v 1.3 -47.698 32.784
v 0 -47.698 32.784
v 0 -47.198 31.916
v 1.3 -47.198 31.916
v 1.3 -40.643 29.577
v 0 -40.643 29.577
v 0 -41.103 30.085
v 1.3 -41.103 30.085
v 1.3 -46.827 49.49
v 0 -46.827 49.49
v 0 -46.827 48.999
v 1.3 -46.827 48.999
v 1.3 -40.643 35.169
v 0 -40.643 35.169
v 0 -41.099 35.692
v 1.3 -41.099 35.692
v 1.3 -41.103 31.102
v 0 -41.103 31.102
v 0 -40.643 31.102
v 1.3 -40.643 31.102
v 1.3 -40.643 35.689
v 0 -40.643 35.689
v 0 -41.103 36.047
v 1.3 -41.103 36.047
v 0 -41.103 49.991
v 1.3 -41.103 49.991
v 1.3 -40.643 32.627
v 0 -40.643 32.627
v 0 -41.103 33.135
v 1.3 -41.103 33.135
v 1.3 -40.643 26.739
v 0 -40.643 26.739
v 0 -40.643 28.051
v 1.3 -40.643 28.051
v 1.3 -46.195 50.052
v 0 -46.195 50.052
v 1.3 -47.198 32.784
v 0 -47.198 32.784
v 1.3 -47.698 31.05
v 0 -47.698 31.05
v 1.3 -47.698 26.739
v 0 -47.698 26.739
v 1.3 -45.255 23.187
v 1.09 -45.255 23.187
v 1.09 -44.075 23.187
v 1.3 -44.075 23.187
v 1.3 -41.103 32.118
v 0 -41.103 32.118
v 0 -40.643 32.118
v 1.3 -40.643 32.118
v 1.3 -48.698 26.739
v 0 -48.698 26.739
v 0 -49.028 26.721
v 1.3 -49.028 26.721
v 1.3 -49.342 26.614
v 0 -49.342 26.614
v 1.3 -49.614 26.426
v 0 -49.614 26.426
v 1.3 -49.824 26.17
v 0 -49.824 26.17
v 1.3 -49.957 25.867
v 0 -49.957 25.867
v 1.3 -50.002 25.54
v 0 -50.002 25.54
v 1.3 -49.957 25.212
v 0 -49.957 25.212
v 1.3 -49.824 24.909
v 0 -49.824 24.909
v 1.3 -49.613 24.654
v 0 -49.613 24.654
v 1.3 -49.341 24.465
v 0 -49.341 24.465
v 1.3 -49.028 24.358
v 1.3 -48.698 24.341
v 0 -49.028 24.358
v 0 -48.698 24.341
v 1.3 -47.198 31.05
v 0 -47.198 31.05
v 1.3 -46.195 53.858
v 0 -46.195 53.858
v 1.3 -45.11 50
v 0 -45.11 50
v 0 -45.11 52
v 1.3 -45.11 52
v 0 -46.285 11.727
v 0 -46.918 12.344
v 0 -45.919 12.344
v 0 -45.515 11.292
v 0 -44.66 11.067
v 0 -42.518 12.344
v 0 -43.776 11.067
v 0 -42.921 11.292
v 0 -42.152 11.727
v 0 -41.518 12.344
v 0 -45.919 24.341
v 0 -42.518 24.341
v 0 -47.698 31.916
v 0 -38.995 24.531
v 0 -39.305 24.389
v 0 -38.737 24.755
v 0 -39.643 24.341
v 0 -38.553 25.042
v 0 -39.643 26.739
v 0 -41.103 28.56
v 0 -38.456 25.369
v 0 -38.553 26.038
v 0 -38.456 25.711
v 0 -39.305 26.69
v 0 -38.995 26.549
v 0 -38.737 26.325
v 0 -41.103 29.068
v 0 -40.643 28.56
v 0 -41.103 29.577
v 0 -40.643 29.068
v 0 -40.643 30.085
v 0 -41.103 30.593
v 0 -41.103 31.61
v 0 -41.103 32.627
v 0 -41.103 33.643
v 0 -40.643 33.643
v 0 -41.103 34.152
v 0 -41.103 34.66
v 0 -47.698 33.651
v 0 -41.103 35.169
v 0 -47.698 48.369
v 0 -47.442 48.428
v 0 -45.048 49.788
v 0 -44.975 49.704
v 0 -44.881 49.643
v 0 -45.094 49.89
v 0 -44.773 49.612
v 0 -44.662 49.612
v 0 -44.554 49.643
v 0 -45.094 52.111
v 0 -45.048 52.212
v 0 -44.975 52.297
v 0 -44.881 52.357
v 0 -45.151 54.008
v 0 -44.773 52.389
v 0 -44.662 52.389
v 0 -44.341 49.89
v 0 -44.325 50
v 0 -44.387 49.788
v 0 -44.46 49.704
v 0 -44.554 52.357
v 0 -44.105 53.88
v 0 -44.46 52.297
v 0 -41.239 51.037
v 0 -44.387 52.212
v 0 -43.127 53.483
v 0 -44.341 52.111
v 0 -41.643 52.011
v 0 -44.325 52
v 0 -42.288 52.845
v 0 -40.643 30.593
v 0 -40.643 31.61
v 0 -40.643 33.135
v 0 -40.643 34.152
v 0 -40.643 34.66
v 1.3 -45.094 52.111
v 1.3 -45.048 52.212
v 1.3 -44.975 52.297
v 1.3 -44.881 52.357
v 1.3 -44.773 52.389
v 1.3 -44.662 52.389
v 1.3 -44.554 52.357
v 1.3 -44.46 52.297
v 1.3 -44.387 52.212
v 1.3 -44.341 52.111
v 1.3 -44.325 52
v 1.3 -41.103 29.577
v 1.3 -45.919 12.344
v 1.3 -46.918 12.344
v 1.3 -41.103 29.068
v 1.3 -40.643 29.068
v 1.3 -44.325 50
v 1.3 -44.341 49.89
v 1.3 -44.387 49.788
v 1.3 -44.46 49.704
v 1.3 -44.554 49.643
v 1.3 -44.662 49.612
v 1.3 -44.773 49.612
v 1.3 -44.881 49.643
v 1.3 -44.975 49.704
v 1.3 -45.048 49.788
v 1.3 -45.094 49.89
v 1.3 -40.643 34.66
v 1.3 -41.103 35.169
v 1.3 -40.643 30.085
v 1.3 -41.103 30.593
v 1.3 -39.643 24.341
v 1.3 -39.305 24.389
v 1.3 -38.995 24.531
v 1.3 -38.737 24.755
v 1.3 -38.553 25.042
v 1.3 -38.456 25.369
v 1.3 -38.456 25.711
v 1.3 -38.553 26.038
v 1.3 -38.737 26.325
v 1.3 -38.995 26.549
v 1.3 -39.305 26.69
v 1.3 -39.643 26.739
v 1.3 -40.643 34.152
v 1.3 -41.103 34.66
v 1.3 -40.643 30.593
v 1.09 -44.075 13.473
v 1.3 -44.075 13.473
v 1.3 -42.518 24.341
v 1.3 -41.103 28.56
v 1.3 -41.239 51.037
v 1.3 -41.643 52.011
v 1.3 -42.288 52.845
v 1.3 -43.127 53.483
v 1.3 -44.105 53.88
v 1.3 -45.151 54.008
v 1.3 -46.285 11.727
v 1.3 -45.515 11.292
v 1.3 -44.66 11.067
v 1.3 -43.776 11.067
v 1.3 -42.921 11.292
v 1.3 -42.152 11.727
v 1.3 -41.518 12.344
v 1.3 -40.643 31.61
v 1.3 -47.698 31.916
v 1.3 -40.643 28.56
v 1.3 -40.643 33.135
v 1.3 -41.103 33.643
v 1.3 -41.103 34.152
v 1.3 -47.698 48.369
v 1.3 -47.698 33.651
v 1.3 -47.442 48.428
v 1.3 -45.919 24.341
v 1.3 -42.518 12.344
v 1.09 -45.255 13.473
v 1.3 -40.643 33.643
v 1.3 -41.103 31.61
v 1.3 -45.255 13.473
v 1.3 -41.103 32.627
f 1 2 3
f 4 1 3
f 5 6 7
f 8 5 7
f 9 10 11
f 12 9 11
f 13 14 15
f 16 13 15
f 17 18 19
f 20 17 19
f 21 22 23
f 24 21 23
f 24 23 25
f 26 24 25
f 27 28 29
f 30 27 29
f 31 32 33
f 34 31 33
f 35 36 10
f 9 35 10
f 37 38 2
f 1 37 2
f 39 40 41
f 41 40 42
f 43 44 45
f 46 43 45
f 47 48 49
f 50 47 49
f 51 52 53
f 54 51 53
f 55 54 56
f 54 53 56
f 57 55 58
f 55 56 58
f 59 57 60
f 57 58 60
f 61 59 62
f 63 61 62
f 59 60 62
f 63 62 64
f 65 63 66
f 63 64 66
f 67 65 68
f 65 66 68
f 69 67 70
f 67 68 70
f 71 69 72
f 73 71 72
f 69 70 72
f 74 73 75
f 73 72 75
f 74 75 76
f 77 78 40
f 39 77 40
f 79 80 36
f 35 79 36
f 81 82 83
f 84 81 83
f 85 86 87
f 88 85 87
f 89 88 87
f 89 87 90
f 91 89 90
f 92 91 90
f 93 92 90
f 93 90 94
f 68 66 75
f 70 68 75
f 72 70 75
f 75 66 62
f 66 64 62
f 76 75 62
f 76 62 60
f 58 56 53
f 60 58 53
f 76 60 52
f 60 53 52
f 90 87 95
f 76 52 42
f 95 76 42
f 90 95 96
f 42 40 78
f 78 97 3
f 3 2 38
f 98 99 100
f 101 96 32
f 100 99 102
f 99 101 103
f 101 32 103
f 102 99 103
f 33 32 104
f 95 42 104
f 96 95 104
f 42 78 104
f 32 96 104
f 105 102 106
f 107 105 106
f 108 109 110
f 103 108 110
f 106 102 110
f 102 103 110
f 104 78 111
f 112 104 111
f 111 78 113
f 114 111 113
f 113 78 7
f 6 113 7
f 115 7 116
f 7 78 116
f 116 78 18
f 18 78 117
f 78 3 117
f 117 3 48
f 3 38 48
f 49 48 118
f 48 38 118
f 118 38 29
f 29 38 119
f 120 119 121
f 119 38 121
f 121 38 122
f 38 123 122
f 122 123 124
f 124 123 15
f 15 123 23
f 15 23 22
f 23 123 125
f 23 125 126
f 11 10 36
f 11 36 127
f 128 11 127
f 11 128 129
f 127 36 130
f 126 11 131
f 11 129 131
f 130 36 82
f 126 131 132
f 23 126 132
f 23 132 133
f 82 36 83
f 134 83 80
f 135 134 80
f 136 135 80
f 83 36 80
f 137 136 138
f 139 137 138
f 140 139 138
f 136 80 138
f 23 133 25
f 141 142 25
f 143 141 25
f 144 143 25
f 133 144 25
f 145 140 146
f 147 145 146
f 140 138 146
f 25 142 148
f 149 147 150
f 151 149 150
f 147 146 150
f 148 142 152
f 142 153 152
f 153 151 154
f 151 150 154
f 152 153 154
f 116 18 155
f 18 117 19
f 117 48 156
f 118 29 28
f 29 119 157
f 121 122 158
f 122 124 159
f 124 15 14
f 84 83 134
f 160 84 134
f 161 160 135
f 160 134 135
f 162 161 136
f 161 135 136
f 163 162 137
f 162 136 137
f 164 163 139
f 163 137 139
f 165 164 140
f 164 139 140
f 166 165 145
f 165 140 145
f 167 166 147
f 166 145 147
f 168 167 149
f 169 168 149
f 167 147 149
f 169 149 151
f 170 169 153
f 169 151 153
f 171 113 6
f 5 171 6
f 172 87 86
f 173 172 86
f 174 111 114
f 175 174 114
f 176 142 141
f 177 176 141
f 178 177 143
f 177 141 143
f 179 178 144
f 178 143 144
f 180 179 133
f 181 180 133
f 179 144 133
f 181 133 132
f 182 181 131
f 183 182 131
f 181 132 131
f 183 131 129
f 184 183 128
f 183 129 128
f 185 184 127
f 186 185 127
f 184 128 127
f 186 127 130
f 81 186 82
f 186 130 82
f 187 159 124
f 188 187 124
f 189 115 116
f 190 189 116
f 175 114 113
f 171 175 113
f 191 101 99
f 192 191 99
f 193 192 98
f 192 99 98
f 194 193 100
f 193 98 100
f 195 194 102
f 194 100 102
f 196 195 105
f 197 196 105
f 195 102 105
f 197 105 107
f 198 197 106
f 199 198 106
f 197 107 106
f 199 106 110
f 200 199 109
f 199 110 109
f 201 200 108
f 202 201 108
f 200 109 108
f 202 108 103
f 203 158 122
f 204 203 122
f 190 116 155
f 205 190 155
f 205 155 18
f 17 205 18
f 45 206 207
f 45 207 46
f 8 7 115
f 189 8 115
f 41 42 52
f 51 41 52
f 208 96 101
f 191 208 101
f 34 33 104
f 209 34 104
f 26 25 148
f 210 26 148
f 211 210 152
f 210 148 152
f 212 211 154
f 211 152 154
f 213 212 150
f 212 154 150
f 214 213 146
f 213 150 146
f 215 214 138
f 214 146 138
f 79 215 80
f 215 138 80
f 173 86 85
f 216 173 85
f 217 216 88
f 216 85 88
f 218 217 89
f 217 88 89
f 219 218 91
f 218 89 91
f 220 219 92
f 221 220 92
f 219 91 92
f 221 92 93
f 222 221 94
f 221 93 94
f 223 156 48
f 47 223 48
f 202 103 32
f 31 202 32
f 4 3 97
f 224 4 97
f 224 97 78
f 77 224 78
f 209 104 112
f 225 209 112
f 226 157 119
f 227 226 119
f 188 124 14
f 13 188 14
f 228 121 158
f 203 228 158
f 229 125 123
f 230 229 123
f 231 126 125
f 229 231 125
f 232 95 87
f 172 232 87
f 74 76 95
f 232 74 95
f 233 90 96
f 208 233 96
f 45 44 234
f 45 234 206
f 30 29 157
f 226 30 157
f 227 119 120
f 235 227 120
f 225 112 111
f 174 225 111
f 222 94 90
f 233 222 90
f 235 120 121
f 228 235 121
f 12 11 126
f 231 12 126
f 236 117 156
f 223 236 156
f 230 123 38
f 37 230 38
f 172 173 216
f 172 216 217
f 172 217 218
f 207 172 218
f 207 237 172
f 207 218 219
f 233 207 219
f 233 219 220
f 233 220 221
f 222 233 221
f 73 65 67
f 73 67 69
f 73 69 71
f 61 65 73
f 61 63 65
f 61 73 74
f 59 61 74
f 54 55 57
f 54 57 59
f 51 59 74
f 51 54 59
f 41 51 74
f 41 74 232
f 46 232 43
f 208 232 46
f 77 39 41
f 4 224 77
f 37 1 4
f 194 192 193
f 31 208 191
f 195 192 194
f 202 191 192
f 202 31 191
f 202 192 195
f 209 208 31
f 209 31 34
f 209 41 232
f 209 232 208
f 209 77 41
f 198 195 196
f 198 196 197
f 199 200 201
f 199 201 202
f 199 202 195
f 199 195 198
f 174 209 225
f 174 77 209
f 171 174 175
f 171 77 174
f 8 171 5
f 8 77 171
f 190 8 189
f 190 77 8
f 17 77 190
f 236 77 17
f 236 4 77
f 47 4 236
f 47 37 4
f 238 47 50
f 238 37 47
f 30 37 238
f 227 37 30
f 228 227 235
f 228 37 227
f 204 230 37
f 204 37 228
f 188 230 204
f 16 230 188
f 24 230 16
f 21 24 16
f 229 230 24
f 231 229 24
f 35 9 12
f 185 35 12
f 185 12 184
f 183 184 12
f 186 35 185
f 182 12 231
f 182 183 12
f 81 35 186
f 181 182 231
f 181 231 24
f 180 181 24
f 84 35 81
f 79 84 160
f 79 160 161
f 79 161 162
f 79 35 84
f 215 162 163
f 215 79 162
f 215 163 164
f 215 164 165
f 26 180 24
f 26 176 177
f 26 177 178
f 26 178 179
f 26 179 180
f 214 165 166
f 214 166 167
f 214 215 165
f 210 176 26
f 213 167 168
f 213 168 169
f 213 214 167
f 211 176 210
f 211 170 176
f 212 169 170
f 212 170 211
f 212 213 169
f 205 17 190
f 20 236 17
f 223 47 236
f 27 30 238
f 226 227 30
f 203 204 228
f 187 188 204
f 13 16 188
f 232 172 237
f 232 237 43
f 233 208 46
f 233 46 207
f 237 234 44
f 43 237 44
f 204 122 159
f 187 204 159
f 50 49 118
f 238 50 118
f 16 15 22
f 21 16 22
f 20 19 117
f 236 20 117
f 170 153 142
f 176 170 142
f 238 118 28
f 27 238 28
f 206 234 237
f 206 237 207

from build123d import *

# Parameters (mm, degrees)
F0_W     = 1.180834
F0_H     = 9.713203
F1_DEPTH = 1.3
F2_W     = 1.340505
F2_H     = 10.058258
F3_DEPTH = 1.09


with BuildPart() as f1:
    # F0 (on Right) → F1 (new body)
    with BuildSketch(Plane.YZ):
        with BuildLine():
            Line((-42.517653, 24.340816), (-45.919107, 24.340582))
            Line((-45.919107, 24.340582), (-45.919107, 12.343948))
            Line((-45.919107, 12.343948), (-42.517653, 12.343948))
            Line((-42.517653, 12.343948), (-42.517653, 14.488947))
            Line((-42.517653, 14.488947), (-42.917089, 14.488947))
            ThreePointArc((-42.917089, 14.488947), (-43.065188, 14.637046), (-42.917089, 14.785144))
            ThreePointArc((-42.917089, 14.785144), (-43.067147, 14.935202), (-42.917089, 15.08526))
            ThreePointArc((-42.917089, 15.08526), (-43.067148, 15.235318), (-42.917089, 15.385376))
            ThreePointArc((-42.917089, 15.385376), (-43.067147, 15.535434), (-42.917089, 15.685491))
            Line((-42.917089, 15.685491), (-42.517653, 15.685491))
            Line((-42.517653, 15.685491), (-42.517653, 15.985669))
            Line((-42.517653, 15.985669), (-42.917089, 15.985669))
            ThreePointArc((-42.917089, 15.985669), (-43.066833, 16.135412), (-42.917089, 16.285156))
            ThreePointArc((-42.917089, 16.285156), (-43.06723, 16.435296), (-42.917089, 16.585436))
            ThreePointArc((-42.917089, 16.585436), (-43.066944, 16.735291), (-42.917089, 16.885145))
            ThreePointArc((-42.917089, 16.885145), (-43.066944, 17.034999), (-42.917089, 17.184854))
            ThreePointArc((-42.917089, 17.184854), (-43.066939, 17.334703), (-42.917089, 17.484553))
            ThreePointArc((-42.917089, 17.484553), (-43.066944, 17.634407), (-42.917089, 17.784262))
            ThreePointArc((-42.917089, 17.784262), (-43.06694, 17.934112), (-42.917089, 18.083963))
            ThreePointArc((-42.917089, 18.083963), (-43.067242, 18.234115), (-42.917089, 18.384267))
            ThreePointArc((-42.917089, 18.384267), (-43.067037, 18.534215), (-42.917089, 18.684162))
            ThreePointArc((-42.917089, 18.684162), (-43.067005, 18.834078), (-42.917089, 18.983994))
            ThreePointArc((-42.917089, 18.983994), (-43.067149, 19.134053), (-42.917089, 19.284112))
            ThreePointArc((-42.917089, 19.284112), (-43.067628, 19.434651), (-42.917089, 19.58519))
            ThreePointArc((-42.917089, 19.58519), (-43.067149, 19.735249), (-42.917089, 19.885308))
            ThreePointArc((-42.917089, 19.885308), (-43.067196, 20.035415), (-42.917089, 20.185521))
            ThreePointArc((-42.917089, 20.185521), (-43.067148, 20.335579), (-42.917089, 20.485638))
            ThreePointArc((-42.917089, 20.485638), (-43.067148, 20.635696), (-42.917089, 20.785754))
            ThreePointArc((-42.917089, 20.785754), (-43.067148, 20.935812), (-42.917089, 21.085871))
            ThreePointArc((-42.917089, 21.085871), (-43.067302, 21.236084), (-42.917089, 21.386296))
            ThreePointArc((-42.917089, 21.386296), (-43.067148, 21.536355), (-42.917089, 21.686413))
            ThreePointArc((-42.917089, 21.686413), (-43.067147, 21.83647), (-42.917089, 21.986527))
            ThreePointArc((-42.917089, 21.986527), (-43.067058, 22.136496), (-42.917089, 22.286465))
            ThreePointArc((-42.917089, 22.286465), (-43.067286, 22.436662), (-42.917089, 22.586859))
            ThreePointArc((-42.917089, 22.586859), (-43.066941, 22.736711), (-42.917089, 22.886562))
            ThreePointArc((-42.917089, 22.886562), (-43.067068, 23.03654), (-42.917089, 23.186519))
            Line((-42.917089, 23.186519), (-42.517653, 23.186519))
            Line((-42.517653, 23.186519), (-42.517653, 24.340816))
        make_face()
        with Locations((-44.665031, 18.329918)):
            Rectangle(F0_W, F0_H, mode=Mode.SUBTRACT)
        Polygon((-48.698063, 24.340582), (-45.919107, 24.340582), (-42.517653, 24.340816), (-39.643239, 24.340816), (-39.643239, 26.738991), (-40.643002, 26.738991), (-47.697753, 26.738757), (-48.698142, 26.738757), align=None)
        with BuildLine():
            Line((-42.517653, 12.343948), (-45.919107, 12.343948))
            Line((-45.919107, 12.343948), (-46.918346, 12.343948))
            ThreePointArc((-46.918346, 12.343948), (-44.21838, 11.039016), (-41.518413, 12.343948))
            Line((-41.518413, 12.343948), (-42.517653, 12.343948))
        make_face()
        with BuildLine():
            ThreePointArc((-48.698142, 26.738757), (-50.002455, 25.539626), (-48.698063, 24.340582))
            Line((-48.698063, 24.340582), (-48.698142, 26.738757))
        make_face()
        with BuildLine():
            Line((-42.517653, 22.886562), (-42.517653, 23.186519))
            Line((-42.517653, 23.186519), (-42.917089, 23.186519))
            ThreePointArc((-42.917089, 23.186519), (-43.067068, 23.03654), (-42.917089, 22.886562))
            Line((-42.917089, 22.886562), (-42.517653, 22.886562))
        make_face()
        with BuildLine():
            Line((-39.643239, 26.738991), (-39.643239, 24.340816))
            ThreePointArc((-39.643239, 24.340816), (-38.444152, 25.539904), (-39.643239, 26.738991))
        make_face()
        with BuildLine():
            Line((-42.917089, 14.488947), (-42.517653, 14.488947))
            Line((-42.517653, 14.488947), (-42.517653, 14.785144))
            Line((-42.517653, 14.785144), (-42.917089, 14.785144))
            ThreePointArc((-42.917089, 14.785144), (-43.065188, 14.637046), (-42.917089, 14.488947))
        make_face()
        with BuildLine():
            Line((-42.517653, 22.586859), (-42.517653, 22.886562))
            Line((-42.517653, 22.886562), (-42.917089, 22.886562))
            ThreePointArc((-42.917089, 22.886562), (-43.066941, 22.736711), (-42.917089, 22.586859))
            Line((-42.917089, 22.586859), (-42.517653, 22.586859))
        make_face()
        Polygon((-47.697753, 31.049623), (-47.697753, 26.738757), (-40.643002, 26.738991), (-40.643002, 28.051442), (-41.102504, 28.559806), (-40.643002, 28.559806), (-41.102504, 29.068169), (-40.643002, 29.068169), (-41.102504, 29.576532), (-40.643002, 29.576532), (-41.102504, 30.084895), (-40.643002, 30.084895), (-41.102504, 30.593258), (-40.643002, 30.593258), (-41.102504, 31.101622), (-40.643002, 31.101622), (-41.102504, 31.609985), (-40.643002, 31.609985), (-41.102504, 32.118348), (-40.643002, 32.118348), (-41.102504, 32.626711), (-40.643002, 32.626711), (-41.102504, 33.135074), (-40.643002, 33.135074), (-41.102504, 33.643438), (-40.643002, 33.643438), (-41.102504, 34.151801), (-40.643002, 34.151801), (-41.102504, 34.660164), (-40.643002, 34.660164), (-41.102506, 35.168528), (-40.643002, 35.168528), (-41.09862, 35.692447), (-40.643002, 35.68899), (-41.102506, 36.046506), (-42.228938, 36.922926), (-42.228938, 47.611012), (-42.228938, 48.368792), (-42.228938, 49.656781), (-42.228938, 50.742287), (-42.82525, 51.877759), (-43.982454, 52.871555), (-44.859211, 53.49781), (-45.443715, 53.858385), (-46.195191, 53.858385), (-46.195191, 50.859235), (-46.195191, 50.051756), (-46.82713, 49.490034), (-46.82713, 48.998524), (-47.441577, 48.428061), (-47.697753, 48.368792), (-47.697753, 33.65064), (-47.198169, 32.784375), (-47.697753, 32.784375), (-47.198169, 31.915889), (-47.697753, 31.915889), (-47.198169, 31.049623), align=None)
        with BuildLine():
            ThreePointArc((-44.324707, 50.000324), (-44.717461, 49.60757), (-45.110214, 50.000324))
            Line((-45.110214, 50.000324), (-45.110214, 51.999949))
            ThreePointArc((-45.110214, 51.999949), (-44.717461, 52.392702), (-44.324707, 51.999949))
            Line((-44.324707, 51.999949), (-44.324707, 50.000324))
        make_face(mode=Mode.SUBTRACT)
        with BuildLine():
            Line((-42.917089, 14.785144), (-42.517653, 14.785144))
            Line((-42.517653, 14.785144), (-42.517653, 15.08526))
            Line((-42.517653, 15.08526), (-42.917089, 15.08526))
            ThreePointArc((-42.917089, 15.08526), (-43.067147, 14.935202), (-42.917089, 14.785144))
        make_face()
        with BuildLine():
            Line((-42.517653, 22.286465), (-42.517653, 22.586859))
            Line((-42.517653, 22.586859), (-42.917089, 22.586859))
            ThreePointArc((-42.917089, 22.586859), (-43.067286, 22.436662), (-42.917089, 22.286465))
            Line((-42.917089, 22.286465), (-42.517653, 22.286465))
        make_face()
        with BuildLine():
            Line((-42.917089, 15.08526), (-42.517653, 15.08526))
            Line((-42.517653, 15.08526), (-42.517653, 15.385376))
            Line((-42.517653, 15.385376), (-42.917089, 15.385376))
            ThreePointArc((-42.917089, 15.385376), (-43.067148, 15.235318), (-42.917089, 15.08526))
        make_face()
        with BuildLine():
            Line((-42.517653, 21.986527), (-42.517653, 22.286465))
            Line((-42.517653, 22.286465), (-42.917089, 22.286465))
            ThreePointArc((-42.917089, 22.286465), (-43.067058, 22.136496), (-42.917089, 21.986527))
            Line((-42.917089, 21.986527), (-42.517653, 21.986527))
        make_face()
        with BuildLine():
            Line((-42.917089, 15.385376), (-42.517653, 15.385376))
            Line((-42.517653, 15.385376), (-42.517653, 15.685491))
            Line((-42.517653, 15.685491), (-42.917089, 15.685491))
            ThreePointArc((-42.917089, 15.685491), (-43.067147, 15.535434), (-42.917089, 15.385376))
        make_face()
        with BuildLine():
            Line((-42.517653, 21.686413), (-42.517653, 21.986527))
            Line((-42.517653, 21.986527), (-42.917089, 21.986527))
            ThreePointArc((-42.917089, 21.986527), (-43.067147, 21.83647), (-42.917089, 21.686413))
            Line((-42.917089, 21.686413), (-42.517653, 21.686413))
        make_face()
        with BuildLine():
            Line((-42.517653, 21.386296), (-42.517653, 21.686413))
            Line((-42.517653, 21.686413), (-42.917089, 21.686413))
            ThreePointArc((-42.917089, 21.686413), (-43.067148, 21.536355), (-42.917089, 21.386296))
            Line((-42.917089, 21.386296), (-42.517653, 21.386296))
        make_face()
        with BuildLine():
            Line((-42.917089, 15.985669), (-42.517653, 15.985669))
            Line((-42.517653, 15.985669), (-42.517653, 16.285156))
            Line((-42.517653, 16.285156), (-42.917089, 16.285156))
            ThreePointArc((-42.917089, 16.285156), (-43.066833, 16.135412), (-42.917089, 15.985669))
        make_face()
        with BuildLine():
            Line((-42.517653, 21.085871), (-42.517653, 21.386296))
            Line((-42.517653, 21.386296), (-42.917089, 21.386296))
            ThreePointArc((-42.917089, 21.386296), (-43.067302, 21.236084), (-42.917089, 21.085871))
            Line((-42.917089, 21.085871), (-42.517653, 21.085871))
        make_face()
        with BuildLine():
            Line((-42.917089, 16.285156), (-42.517653, 16.285156))
            Line((-42.517653, 16.285156), (-42.517653, 16.585436))
            Line((-42.517653, 16.585436), (-42.917089, 16.585436))
            ThreePointArc((-42.917089, 16.585436), (-43.06723, 16.435296), (-42.917089, 16.285156))
        make_face()
        with BuildLine():
            Line((-42.517653, 20.785754), (-42.517653, 21.085871))
            Line((-42.517653, 21.085871), (-42.917089, 21.085871))
            ThreePointArc((-42.917089, 21.085871), (-43.067148, 20.935812), (-42.917089, 20.785754))
            Line((-42.917089, 20.785754), (-42.517653, 20.785754))
        make_face()
        with BuildLine():
            Line((-42.917089, 16.585436), (-42.517653, 16.585436))
            Line((-42.517653, 16.585436), (-42.517653, 16.885145))
            Line((-42.517653, 16.885145), (-42.917089, 16.885145))
            ThreePointArc((-42.917089, 16.885145), (-43.066944, 16.735291), (-42.917089, 16.585436))
        make_face()
        with BuildLine():
            Line((-42.517653, 20.485638), (-42.517653, 20.785754))
            Line((-42.517653, 20.785754), (-42.917089, 20.785754))
            ThreePointArc((-42.917089, 20.785754), (-43.067148, 20.635696), (-42.917089, 20.485638))
            Line((-42.917089, 20.485638), (-42.517653, 20.485638))
        make_face()
        with BuildLine():
            Line((-42.917089, 16.885145), (-42.517653, 16.885145))
            Line((-42.517653, 16.885145), (-42.517653, 17.184854))
            Line((-42.517653, 17.184854), (-42.917089, 17.184854))
            ThreePointArc((-42.917089, 17.184854), (-43.066944, 17.034999), (-42.917089, 16.885145))
        make_face()
        with BuildLine():
            Line((-42.517653, 20.185521), (-42.517653, 20.485638))
            Line((-42.517653, 20.485638), (-42.917089, 20.485638))
            ThreePointArc((-42.917089, 20.485638), (-43.067148, 20.335579), (-42.917089, 20.185521))
            Line((-42.917089, 20.185521), (-42.517653, 20.185521))
        make_face()
        with BuildLine():
            Line((-42.917089, 17.184854), (-42.517653, 17.184854))
            Line((-42.517653, 17.184854), (-42.517653, 17.484553))
            Line((-42.517653, 17.484553), (-42.917089, 17.484553))
            ThreePointArc((-42.917089, 17.484553), (-43.066939, 17.334703), (-42.917089, 17.184854))
        make_face()
        with BuildLine():
            Line((-42.517653, 19.885308), (-42.517653, 20.185521))
            Line((-42.517653, 20.185521), (-42.917089, 20.185521))
            ThreePointArc((-42.917089, 20.185521), (-43.067196, 20.035415), (-42.917089, 19.885308))
            Line((-42.917089, 19.885308), (-42.517653, 19.885308))
        make_face()
        with BuildLine():
            Line((-42.917089, 17.484553), (-42.517653, 17.484553))
            Line((-42.517653, 17.484553), (-42.517653, 17.784262))
            Line((-42.517653, 17.784262), (-42.917089, 17.784262))
            ThreePointArc((-42.917089, 17.784262), (-43.066944, 17.634407), (-42.917089, 17.484553))
        make_face()
        with BuildLine():
            Line((-42.517653, 19.58519), (-42.517653, 19.885308))
            Line((-42.517653, 19.885308), (-42.917089, 19.885308))
            ThreePointArc((-42.917089, 19.885308), (-43.067149, 19.735249), (-42.917089, 19.58519))
            Line((-42.917089, 19.58519), (-42.517653, 19.58519))
        make_face()
        with BuildLine():
            Line((-42.917089, 17.784262), (-42.517653, 17.784262))
            Line((-42.517653, 17.784262), (-42.517653, 18.083963))
            Line((-42.517653, 18.083963), (-42.917089, 18.083963))
            ThreePointArc((-42.917089, 18.083963), (-43.06694, 17.934112), (-42.917089, 17.784262))
        make_face()
        with BuildLine():
            Line((-42.517653, 19.284112), (-42.517653, 19.58519))
            Line((-42.517653, 19.58519), (-42.917089, 19.58519))
            ThreePointArc((-42.917089, 19.58519), (-43.067628, 19.434651), (-42.917089, 19.284112))
            Line((-42.917089, 19.284112), (-42.517653, 19.284112))
        make_face()
        with BuildLine():
            Line((-42.917089, 18.083963), (-42.517653, 18.083963))
            Line((-42.517653, 18.083963), (-42.517653, 18.384267))
            Line((-42.517653, 18.384267), (-42.917089, 18.384267))
            ThreePointArc((-42.917089, 18.384267), (-43.067242, 18.234115), (-42.917089, 18.083963))
        make_face()
        with BuildLine():
            Line((-42.517653, 18.983994), (-42.517653, 19.284112))
            Line((-42.517653, 19.284112), (-42.917089, 19.284112))
            ThreePointArc((-42.917089, 19.284112), (-43.067149, 19.134053), (-42.917089, 18.983994))
            Line((-42.917089, 18.983994), (-42.517653, 18.983994))
        make_face()
        with BuildLine():
            Line((-42.917089, 18.384267), (-42.517653, 18.384267))
            Line((-42.517653, 18.384267), (-42.517653, 18.684162))
            Line((-42.517653, 18.684162), (-42.917089, 18.684162))
            ThreePointArc((-42.917089, 18.684162), (-43.067037, 18.534215), (-42.917089, 18.384267))
        make_face()
        with BuildLine():
            Line((-42.517653, 18.684162), (-42.517653, 18.983994))
            Line((-42.517653, 18.983994), (-42.917089, 18.983994))
            ThreePointArc((-42.917089, 18.983994), (-43.067005, 18.834078), (-42.917089, 18.684162))
            Line((-42.917089, 18.684162), (-42.517653, 18.684162))
        make_face()
        with BuildLine():
            ThreePointArc((-41.102506, 49.991072), (-42.686453, 53.192062), (-46.195191, 53.858385))
            Line((-46.195191, 53.858385), (-45.443715, 53.858385))
            Line((-45.443715, 53.858385), (-44.859211, 53.49781))
            Line((-44.859211, 53.49781), (-43.982454, 52.871555))
            Line((-43.982454, 52.871555), (-42.82525, 51.877759))
            Line((-42.82525, 51.877759), (-42.228938, 50.742287))
            Line((-42.228938, 50.742287), (-42.228938, 49.656781))
            Line((-42.228938, 49.656781), (-42.228938, 48.368792))
            Line((-42.228938, 48.368792), (-42.228938, 47.611012))
            Line((-42.228938, 47.611012), (-42.228938, 36.922926))
            Line((-42.228938, 36.922926), (-41.102506, 36.046506))
            Line((-41.102506, 36.046506), (-41.102506, 49.991072))
        make_face()
    extrude(amount=F1_DEPTH)

    # F2 (on Right) → F3 (join)
    with BuildSketch(Plane.YZ):
        with Locations((-44.653972, 18.316656)):
            Rectangle(F2_W, F2_H)
    extrude(amount=F3_DEPTH)


solid = f1.part
